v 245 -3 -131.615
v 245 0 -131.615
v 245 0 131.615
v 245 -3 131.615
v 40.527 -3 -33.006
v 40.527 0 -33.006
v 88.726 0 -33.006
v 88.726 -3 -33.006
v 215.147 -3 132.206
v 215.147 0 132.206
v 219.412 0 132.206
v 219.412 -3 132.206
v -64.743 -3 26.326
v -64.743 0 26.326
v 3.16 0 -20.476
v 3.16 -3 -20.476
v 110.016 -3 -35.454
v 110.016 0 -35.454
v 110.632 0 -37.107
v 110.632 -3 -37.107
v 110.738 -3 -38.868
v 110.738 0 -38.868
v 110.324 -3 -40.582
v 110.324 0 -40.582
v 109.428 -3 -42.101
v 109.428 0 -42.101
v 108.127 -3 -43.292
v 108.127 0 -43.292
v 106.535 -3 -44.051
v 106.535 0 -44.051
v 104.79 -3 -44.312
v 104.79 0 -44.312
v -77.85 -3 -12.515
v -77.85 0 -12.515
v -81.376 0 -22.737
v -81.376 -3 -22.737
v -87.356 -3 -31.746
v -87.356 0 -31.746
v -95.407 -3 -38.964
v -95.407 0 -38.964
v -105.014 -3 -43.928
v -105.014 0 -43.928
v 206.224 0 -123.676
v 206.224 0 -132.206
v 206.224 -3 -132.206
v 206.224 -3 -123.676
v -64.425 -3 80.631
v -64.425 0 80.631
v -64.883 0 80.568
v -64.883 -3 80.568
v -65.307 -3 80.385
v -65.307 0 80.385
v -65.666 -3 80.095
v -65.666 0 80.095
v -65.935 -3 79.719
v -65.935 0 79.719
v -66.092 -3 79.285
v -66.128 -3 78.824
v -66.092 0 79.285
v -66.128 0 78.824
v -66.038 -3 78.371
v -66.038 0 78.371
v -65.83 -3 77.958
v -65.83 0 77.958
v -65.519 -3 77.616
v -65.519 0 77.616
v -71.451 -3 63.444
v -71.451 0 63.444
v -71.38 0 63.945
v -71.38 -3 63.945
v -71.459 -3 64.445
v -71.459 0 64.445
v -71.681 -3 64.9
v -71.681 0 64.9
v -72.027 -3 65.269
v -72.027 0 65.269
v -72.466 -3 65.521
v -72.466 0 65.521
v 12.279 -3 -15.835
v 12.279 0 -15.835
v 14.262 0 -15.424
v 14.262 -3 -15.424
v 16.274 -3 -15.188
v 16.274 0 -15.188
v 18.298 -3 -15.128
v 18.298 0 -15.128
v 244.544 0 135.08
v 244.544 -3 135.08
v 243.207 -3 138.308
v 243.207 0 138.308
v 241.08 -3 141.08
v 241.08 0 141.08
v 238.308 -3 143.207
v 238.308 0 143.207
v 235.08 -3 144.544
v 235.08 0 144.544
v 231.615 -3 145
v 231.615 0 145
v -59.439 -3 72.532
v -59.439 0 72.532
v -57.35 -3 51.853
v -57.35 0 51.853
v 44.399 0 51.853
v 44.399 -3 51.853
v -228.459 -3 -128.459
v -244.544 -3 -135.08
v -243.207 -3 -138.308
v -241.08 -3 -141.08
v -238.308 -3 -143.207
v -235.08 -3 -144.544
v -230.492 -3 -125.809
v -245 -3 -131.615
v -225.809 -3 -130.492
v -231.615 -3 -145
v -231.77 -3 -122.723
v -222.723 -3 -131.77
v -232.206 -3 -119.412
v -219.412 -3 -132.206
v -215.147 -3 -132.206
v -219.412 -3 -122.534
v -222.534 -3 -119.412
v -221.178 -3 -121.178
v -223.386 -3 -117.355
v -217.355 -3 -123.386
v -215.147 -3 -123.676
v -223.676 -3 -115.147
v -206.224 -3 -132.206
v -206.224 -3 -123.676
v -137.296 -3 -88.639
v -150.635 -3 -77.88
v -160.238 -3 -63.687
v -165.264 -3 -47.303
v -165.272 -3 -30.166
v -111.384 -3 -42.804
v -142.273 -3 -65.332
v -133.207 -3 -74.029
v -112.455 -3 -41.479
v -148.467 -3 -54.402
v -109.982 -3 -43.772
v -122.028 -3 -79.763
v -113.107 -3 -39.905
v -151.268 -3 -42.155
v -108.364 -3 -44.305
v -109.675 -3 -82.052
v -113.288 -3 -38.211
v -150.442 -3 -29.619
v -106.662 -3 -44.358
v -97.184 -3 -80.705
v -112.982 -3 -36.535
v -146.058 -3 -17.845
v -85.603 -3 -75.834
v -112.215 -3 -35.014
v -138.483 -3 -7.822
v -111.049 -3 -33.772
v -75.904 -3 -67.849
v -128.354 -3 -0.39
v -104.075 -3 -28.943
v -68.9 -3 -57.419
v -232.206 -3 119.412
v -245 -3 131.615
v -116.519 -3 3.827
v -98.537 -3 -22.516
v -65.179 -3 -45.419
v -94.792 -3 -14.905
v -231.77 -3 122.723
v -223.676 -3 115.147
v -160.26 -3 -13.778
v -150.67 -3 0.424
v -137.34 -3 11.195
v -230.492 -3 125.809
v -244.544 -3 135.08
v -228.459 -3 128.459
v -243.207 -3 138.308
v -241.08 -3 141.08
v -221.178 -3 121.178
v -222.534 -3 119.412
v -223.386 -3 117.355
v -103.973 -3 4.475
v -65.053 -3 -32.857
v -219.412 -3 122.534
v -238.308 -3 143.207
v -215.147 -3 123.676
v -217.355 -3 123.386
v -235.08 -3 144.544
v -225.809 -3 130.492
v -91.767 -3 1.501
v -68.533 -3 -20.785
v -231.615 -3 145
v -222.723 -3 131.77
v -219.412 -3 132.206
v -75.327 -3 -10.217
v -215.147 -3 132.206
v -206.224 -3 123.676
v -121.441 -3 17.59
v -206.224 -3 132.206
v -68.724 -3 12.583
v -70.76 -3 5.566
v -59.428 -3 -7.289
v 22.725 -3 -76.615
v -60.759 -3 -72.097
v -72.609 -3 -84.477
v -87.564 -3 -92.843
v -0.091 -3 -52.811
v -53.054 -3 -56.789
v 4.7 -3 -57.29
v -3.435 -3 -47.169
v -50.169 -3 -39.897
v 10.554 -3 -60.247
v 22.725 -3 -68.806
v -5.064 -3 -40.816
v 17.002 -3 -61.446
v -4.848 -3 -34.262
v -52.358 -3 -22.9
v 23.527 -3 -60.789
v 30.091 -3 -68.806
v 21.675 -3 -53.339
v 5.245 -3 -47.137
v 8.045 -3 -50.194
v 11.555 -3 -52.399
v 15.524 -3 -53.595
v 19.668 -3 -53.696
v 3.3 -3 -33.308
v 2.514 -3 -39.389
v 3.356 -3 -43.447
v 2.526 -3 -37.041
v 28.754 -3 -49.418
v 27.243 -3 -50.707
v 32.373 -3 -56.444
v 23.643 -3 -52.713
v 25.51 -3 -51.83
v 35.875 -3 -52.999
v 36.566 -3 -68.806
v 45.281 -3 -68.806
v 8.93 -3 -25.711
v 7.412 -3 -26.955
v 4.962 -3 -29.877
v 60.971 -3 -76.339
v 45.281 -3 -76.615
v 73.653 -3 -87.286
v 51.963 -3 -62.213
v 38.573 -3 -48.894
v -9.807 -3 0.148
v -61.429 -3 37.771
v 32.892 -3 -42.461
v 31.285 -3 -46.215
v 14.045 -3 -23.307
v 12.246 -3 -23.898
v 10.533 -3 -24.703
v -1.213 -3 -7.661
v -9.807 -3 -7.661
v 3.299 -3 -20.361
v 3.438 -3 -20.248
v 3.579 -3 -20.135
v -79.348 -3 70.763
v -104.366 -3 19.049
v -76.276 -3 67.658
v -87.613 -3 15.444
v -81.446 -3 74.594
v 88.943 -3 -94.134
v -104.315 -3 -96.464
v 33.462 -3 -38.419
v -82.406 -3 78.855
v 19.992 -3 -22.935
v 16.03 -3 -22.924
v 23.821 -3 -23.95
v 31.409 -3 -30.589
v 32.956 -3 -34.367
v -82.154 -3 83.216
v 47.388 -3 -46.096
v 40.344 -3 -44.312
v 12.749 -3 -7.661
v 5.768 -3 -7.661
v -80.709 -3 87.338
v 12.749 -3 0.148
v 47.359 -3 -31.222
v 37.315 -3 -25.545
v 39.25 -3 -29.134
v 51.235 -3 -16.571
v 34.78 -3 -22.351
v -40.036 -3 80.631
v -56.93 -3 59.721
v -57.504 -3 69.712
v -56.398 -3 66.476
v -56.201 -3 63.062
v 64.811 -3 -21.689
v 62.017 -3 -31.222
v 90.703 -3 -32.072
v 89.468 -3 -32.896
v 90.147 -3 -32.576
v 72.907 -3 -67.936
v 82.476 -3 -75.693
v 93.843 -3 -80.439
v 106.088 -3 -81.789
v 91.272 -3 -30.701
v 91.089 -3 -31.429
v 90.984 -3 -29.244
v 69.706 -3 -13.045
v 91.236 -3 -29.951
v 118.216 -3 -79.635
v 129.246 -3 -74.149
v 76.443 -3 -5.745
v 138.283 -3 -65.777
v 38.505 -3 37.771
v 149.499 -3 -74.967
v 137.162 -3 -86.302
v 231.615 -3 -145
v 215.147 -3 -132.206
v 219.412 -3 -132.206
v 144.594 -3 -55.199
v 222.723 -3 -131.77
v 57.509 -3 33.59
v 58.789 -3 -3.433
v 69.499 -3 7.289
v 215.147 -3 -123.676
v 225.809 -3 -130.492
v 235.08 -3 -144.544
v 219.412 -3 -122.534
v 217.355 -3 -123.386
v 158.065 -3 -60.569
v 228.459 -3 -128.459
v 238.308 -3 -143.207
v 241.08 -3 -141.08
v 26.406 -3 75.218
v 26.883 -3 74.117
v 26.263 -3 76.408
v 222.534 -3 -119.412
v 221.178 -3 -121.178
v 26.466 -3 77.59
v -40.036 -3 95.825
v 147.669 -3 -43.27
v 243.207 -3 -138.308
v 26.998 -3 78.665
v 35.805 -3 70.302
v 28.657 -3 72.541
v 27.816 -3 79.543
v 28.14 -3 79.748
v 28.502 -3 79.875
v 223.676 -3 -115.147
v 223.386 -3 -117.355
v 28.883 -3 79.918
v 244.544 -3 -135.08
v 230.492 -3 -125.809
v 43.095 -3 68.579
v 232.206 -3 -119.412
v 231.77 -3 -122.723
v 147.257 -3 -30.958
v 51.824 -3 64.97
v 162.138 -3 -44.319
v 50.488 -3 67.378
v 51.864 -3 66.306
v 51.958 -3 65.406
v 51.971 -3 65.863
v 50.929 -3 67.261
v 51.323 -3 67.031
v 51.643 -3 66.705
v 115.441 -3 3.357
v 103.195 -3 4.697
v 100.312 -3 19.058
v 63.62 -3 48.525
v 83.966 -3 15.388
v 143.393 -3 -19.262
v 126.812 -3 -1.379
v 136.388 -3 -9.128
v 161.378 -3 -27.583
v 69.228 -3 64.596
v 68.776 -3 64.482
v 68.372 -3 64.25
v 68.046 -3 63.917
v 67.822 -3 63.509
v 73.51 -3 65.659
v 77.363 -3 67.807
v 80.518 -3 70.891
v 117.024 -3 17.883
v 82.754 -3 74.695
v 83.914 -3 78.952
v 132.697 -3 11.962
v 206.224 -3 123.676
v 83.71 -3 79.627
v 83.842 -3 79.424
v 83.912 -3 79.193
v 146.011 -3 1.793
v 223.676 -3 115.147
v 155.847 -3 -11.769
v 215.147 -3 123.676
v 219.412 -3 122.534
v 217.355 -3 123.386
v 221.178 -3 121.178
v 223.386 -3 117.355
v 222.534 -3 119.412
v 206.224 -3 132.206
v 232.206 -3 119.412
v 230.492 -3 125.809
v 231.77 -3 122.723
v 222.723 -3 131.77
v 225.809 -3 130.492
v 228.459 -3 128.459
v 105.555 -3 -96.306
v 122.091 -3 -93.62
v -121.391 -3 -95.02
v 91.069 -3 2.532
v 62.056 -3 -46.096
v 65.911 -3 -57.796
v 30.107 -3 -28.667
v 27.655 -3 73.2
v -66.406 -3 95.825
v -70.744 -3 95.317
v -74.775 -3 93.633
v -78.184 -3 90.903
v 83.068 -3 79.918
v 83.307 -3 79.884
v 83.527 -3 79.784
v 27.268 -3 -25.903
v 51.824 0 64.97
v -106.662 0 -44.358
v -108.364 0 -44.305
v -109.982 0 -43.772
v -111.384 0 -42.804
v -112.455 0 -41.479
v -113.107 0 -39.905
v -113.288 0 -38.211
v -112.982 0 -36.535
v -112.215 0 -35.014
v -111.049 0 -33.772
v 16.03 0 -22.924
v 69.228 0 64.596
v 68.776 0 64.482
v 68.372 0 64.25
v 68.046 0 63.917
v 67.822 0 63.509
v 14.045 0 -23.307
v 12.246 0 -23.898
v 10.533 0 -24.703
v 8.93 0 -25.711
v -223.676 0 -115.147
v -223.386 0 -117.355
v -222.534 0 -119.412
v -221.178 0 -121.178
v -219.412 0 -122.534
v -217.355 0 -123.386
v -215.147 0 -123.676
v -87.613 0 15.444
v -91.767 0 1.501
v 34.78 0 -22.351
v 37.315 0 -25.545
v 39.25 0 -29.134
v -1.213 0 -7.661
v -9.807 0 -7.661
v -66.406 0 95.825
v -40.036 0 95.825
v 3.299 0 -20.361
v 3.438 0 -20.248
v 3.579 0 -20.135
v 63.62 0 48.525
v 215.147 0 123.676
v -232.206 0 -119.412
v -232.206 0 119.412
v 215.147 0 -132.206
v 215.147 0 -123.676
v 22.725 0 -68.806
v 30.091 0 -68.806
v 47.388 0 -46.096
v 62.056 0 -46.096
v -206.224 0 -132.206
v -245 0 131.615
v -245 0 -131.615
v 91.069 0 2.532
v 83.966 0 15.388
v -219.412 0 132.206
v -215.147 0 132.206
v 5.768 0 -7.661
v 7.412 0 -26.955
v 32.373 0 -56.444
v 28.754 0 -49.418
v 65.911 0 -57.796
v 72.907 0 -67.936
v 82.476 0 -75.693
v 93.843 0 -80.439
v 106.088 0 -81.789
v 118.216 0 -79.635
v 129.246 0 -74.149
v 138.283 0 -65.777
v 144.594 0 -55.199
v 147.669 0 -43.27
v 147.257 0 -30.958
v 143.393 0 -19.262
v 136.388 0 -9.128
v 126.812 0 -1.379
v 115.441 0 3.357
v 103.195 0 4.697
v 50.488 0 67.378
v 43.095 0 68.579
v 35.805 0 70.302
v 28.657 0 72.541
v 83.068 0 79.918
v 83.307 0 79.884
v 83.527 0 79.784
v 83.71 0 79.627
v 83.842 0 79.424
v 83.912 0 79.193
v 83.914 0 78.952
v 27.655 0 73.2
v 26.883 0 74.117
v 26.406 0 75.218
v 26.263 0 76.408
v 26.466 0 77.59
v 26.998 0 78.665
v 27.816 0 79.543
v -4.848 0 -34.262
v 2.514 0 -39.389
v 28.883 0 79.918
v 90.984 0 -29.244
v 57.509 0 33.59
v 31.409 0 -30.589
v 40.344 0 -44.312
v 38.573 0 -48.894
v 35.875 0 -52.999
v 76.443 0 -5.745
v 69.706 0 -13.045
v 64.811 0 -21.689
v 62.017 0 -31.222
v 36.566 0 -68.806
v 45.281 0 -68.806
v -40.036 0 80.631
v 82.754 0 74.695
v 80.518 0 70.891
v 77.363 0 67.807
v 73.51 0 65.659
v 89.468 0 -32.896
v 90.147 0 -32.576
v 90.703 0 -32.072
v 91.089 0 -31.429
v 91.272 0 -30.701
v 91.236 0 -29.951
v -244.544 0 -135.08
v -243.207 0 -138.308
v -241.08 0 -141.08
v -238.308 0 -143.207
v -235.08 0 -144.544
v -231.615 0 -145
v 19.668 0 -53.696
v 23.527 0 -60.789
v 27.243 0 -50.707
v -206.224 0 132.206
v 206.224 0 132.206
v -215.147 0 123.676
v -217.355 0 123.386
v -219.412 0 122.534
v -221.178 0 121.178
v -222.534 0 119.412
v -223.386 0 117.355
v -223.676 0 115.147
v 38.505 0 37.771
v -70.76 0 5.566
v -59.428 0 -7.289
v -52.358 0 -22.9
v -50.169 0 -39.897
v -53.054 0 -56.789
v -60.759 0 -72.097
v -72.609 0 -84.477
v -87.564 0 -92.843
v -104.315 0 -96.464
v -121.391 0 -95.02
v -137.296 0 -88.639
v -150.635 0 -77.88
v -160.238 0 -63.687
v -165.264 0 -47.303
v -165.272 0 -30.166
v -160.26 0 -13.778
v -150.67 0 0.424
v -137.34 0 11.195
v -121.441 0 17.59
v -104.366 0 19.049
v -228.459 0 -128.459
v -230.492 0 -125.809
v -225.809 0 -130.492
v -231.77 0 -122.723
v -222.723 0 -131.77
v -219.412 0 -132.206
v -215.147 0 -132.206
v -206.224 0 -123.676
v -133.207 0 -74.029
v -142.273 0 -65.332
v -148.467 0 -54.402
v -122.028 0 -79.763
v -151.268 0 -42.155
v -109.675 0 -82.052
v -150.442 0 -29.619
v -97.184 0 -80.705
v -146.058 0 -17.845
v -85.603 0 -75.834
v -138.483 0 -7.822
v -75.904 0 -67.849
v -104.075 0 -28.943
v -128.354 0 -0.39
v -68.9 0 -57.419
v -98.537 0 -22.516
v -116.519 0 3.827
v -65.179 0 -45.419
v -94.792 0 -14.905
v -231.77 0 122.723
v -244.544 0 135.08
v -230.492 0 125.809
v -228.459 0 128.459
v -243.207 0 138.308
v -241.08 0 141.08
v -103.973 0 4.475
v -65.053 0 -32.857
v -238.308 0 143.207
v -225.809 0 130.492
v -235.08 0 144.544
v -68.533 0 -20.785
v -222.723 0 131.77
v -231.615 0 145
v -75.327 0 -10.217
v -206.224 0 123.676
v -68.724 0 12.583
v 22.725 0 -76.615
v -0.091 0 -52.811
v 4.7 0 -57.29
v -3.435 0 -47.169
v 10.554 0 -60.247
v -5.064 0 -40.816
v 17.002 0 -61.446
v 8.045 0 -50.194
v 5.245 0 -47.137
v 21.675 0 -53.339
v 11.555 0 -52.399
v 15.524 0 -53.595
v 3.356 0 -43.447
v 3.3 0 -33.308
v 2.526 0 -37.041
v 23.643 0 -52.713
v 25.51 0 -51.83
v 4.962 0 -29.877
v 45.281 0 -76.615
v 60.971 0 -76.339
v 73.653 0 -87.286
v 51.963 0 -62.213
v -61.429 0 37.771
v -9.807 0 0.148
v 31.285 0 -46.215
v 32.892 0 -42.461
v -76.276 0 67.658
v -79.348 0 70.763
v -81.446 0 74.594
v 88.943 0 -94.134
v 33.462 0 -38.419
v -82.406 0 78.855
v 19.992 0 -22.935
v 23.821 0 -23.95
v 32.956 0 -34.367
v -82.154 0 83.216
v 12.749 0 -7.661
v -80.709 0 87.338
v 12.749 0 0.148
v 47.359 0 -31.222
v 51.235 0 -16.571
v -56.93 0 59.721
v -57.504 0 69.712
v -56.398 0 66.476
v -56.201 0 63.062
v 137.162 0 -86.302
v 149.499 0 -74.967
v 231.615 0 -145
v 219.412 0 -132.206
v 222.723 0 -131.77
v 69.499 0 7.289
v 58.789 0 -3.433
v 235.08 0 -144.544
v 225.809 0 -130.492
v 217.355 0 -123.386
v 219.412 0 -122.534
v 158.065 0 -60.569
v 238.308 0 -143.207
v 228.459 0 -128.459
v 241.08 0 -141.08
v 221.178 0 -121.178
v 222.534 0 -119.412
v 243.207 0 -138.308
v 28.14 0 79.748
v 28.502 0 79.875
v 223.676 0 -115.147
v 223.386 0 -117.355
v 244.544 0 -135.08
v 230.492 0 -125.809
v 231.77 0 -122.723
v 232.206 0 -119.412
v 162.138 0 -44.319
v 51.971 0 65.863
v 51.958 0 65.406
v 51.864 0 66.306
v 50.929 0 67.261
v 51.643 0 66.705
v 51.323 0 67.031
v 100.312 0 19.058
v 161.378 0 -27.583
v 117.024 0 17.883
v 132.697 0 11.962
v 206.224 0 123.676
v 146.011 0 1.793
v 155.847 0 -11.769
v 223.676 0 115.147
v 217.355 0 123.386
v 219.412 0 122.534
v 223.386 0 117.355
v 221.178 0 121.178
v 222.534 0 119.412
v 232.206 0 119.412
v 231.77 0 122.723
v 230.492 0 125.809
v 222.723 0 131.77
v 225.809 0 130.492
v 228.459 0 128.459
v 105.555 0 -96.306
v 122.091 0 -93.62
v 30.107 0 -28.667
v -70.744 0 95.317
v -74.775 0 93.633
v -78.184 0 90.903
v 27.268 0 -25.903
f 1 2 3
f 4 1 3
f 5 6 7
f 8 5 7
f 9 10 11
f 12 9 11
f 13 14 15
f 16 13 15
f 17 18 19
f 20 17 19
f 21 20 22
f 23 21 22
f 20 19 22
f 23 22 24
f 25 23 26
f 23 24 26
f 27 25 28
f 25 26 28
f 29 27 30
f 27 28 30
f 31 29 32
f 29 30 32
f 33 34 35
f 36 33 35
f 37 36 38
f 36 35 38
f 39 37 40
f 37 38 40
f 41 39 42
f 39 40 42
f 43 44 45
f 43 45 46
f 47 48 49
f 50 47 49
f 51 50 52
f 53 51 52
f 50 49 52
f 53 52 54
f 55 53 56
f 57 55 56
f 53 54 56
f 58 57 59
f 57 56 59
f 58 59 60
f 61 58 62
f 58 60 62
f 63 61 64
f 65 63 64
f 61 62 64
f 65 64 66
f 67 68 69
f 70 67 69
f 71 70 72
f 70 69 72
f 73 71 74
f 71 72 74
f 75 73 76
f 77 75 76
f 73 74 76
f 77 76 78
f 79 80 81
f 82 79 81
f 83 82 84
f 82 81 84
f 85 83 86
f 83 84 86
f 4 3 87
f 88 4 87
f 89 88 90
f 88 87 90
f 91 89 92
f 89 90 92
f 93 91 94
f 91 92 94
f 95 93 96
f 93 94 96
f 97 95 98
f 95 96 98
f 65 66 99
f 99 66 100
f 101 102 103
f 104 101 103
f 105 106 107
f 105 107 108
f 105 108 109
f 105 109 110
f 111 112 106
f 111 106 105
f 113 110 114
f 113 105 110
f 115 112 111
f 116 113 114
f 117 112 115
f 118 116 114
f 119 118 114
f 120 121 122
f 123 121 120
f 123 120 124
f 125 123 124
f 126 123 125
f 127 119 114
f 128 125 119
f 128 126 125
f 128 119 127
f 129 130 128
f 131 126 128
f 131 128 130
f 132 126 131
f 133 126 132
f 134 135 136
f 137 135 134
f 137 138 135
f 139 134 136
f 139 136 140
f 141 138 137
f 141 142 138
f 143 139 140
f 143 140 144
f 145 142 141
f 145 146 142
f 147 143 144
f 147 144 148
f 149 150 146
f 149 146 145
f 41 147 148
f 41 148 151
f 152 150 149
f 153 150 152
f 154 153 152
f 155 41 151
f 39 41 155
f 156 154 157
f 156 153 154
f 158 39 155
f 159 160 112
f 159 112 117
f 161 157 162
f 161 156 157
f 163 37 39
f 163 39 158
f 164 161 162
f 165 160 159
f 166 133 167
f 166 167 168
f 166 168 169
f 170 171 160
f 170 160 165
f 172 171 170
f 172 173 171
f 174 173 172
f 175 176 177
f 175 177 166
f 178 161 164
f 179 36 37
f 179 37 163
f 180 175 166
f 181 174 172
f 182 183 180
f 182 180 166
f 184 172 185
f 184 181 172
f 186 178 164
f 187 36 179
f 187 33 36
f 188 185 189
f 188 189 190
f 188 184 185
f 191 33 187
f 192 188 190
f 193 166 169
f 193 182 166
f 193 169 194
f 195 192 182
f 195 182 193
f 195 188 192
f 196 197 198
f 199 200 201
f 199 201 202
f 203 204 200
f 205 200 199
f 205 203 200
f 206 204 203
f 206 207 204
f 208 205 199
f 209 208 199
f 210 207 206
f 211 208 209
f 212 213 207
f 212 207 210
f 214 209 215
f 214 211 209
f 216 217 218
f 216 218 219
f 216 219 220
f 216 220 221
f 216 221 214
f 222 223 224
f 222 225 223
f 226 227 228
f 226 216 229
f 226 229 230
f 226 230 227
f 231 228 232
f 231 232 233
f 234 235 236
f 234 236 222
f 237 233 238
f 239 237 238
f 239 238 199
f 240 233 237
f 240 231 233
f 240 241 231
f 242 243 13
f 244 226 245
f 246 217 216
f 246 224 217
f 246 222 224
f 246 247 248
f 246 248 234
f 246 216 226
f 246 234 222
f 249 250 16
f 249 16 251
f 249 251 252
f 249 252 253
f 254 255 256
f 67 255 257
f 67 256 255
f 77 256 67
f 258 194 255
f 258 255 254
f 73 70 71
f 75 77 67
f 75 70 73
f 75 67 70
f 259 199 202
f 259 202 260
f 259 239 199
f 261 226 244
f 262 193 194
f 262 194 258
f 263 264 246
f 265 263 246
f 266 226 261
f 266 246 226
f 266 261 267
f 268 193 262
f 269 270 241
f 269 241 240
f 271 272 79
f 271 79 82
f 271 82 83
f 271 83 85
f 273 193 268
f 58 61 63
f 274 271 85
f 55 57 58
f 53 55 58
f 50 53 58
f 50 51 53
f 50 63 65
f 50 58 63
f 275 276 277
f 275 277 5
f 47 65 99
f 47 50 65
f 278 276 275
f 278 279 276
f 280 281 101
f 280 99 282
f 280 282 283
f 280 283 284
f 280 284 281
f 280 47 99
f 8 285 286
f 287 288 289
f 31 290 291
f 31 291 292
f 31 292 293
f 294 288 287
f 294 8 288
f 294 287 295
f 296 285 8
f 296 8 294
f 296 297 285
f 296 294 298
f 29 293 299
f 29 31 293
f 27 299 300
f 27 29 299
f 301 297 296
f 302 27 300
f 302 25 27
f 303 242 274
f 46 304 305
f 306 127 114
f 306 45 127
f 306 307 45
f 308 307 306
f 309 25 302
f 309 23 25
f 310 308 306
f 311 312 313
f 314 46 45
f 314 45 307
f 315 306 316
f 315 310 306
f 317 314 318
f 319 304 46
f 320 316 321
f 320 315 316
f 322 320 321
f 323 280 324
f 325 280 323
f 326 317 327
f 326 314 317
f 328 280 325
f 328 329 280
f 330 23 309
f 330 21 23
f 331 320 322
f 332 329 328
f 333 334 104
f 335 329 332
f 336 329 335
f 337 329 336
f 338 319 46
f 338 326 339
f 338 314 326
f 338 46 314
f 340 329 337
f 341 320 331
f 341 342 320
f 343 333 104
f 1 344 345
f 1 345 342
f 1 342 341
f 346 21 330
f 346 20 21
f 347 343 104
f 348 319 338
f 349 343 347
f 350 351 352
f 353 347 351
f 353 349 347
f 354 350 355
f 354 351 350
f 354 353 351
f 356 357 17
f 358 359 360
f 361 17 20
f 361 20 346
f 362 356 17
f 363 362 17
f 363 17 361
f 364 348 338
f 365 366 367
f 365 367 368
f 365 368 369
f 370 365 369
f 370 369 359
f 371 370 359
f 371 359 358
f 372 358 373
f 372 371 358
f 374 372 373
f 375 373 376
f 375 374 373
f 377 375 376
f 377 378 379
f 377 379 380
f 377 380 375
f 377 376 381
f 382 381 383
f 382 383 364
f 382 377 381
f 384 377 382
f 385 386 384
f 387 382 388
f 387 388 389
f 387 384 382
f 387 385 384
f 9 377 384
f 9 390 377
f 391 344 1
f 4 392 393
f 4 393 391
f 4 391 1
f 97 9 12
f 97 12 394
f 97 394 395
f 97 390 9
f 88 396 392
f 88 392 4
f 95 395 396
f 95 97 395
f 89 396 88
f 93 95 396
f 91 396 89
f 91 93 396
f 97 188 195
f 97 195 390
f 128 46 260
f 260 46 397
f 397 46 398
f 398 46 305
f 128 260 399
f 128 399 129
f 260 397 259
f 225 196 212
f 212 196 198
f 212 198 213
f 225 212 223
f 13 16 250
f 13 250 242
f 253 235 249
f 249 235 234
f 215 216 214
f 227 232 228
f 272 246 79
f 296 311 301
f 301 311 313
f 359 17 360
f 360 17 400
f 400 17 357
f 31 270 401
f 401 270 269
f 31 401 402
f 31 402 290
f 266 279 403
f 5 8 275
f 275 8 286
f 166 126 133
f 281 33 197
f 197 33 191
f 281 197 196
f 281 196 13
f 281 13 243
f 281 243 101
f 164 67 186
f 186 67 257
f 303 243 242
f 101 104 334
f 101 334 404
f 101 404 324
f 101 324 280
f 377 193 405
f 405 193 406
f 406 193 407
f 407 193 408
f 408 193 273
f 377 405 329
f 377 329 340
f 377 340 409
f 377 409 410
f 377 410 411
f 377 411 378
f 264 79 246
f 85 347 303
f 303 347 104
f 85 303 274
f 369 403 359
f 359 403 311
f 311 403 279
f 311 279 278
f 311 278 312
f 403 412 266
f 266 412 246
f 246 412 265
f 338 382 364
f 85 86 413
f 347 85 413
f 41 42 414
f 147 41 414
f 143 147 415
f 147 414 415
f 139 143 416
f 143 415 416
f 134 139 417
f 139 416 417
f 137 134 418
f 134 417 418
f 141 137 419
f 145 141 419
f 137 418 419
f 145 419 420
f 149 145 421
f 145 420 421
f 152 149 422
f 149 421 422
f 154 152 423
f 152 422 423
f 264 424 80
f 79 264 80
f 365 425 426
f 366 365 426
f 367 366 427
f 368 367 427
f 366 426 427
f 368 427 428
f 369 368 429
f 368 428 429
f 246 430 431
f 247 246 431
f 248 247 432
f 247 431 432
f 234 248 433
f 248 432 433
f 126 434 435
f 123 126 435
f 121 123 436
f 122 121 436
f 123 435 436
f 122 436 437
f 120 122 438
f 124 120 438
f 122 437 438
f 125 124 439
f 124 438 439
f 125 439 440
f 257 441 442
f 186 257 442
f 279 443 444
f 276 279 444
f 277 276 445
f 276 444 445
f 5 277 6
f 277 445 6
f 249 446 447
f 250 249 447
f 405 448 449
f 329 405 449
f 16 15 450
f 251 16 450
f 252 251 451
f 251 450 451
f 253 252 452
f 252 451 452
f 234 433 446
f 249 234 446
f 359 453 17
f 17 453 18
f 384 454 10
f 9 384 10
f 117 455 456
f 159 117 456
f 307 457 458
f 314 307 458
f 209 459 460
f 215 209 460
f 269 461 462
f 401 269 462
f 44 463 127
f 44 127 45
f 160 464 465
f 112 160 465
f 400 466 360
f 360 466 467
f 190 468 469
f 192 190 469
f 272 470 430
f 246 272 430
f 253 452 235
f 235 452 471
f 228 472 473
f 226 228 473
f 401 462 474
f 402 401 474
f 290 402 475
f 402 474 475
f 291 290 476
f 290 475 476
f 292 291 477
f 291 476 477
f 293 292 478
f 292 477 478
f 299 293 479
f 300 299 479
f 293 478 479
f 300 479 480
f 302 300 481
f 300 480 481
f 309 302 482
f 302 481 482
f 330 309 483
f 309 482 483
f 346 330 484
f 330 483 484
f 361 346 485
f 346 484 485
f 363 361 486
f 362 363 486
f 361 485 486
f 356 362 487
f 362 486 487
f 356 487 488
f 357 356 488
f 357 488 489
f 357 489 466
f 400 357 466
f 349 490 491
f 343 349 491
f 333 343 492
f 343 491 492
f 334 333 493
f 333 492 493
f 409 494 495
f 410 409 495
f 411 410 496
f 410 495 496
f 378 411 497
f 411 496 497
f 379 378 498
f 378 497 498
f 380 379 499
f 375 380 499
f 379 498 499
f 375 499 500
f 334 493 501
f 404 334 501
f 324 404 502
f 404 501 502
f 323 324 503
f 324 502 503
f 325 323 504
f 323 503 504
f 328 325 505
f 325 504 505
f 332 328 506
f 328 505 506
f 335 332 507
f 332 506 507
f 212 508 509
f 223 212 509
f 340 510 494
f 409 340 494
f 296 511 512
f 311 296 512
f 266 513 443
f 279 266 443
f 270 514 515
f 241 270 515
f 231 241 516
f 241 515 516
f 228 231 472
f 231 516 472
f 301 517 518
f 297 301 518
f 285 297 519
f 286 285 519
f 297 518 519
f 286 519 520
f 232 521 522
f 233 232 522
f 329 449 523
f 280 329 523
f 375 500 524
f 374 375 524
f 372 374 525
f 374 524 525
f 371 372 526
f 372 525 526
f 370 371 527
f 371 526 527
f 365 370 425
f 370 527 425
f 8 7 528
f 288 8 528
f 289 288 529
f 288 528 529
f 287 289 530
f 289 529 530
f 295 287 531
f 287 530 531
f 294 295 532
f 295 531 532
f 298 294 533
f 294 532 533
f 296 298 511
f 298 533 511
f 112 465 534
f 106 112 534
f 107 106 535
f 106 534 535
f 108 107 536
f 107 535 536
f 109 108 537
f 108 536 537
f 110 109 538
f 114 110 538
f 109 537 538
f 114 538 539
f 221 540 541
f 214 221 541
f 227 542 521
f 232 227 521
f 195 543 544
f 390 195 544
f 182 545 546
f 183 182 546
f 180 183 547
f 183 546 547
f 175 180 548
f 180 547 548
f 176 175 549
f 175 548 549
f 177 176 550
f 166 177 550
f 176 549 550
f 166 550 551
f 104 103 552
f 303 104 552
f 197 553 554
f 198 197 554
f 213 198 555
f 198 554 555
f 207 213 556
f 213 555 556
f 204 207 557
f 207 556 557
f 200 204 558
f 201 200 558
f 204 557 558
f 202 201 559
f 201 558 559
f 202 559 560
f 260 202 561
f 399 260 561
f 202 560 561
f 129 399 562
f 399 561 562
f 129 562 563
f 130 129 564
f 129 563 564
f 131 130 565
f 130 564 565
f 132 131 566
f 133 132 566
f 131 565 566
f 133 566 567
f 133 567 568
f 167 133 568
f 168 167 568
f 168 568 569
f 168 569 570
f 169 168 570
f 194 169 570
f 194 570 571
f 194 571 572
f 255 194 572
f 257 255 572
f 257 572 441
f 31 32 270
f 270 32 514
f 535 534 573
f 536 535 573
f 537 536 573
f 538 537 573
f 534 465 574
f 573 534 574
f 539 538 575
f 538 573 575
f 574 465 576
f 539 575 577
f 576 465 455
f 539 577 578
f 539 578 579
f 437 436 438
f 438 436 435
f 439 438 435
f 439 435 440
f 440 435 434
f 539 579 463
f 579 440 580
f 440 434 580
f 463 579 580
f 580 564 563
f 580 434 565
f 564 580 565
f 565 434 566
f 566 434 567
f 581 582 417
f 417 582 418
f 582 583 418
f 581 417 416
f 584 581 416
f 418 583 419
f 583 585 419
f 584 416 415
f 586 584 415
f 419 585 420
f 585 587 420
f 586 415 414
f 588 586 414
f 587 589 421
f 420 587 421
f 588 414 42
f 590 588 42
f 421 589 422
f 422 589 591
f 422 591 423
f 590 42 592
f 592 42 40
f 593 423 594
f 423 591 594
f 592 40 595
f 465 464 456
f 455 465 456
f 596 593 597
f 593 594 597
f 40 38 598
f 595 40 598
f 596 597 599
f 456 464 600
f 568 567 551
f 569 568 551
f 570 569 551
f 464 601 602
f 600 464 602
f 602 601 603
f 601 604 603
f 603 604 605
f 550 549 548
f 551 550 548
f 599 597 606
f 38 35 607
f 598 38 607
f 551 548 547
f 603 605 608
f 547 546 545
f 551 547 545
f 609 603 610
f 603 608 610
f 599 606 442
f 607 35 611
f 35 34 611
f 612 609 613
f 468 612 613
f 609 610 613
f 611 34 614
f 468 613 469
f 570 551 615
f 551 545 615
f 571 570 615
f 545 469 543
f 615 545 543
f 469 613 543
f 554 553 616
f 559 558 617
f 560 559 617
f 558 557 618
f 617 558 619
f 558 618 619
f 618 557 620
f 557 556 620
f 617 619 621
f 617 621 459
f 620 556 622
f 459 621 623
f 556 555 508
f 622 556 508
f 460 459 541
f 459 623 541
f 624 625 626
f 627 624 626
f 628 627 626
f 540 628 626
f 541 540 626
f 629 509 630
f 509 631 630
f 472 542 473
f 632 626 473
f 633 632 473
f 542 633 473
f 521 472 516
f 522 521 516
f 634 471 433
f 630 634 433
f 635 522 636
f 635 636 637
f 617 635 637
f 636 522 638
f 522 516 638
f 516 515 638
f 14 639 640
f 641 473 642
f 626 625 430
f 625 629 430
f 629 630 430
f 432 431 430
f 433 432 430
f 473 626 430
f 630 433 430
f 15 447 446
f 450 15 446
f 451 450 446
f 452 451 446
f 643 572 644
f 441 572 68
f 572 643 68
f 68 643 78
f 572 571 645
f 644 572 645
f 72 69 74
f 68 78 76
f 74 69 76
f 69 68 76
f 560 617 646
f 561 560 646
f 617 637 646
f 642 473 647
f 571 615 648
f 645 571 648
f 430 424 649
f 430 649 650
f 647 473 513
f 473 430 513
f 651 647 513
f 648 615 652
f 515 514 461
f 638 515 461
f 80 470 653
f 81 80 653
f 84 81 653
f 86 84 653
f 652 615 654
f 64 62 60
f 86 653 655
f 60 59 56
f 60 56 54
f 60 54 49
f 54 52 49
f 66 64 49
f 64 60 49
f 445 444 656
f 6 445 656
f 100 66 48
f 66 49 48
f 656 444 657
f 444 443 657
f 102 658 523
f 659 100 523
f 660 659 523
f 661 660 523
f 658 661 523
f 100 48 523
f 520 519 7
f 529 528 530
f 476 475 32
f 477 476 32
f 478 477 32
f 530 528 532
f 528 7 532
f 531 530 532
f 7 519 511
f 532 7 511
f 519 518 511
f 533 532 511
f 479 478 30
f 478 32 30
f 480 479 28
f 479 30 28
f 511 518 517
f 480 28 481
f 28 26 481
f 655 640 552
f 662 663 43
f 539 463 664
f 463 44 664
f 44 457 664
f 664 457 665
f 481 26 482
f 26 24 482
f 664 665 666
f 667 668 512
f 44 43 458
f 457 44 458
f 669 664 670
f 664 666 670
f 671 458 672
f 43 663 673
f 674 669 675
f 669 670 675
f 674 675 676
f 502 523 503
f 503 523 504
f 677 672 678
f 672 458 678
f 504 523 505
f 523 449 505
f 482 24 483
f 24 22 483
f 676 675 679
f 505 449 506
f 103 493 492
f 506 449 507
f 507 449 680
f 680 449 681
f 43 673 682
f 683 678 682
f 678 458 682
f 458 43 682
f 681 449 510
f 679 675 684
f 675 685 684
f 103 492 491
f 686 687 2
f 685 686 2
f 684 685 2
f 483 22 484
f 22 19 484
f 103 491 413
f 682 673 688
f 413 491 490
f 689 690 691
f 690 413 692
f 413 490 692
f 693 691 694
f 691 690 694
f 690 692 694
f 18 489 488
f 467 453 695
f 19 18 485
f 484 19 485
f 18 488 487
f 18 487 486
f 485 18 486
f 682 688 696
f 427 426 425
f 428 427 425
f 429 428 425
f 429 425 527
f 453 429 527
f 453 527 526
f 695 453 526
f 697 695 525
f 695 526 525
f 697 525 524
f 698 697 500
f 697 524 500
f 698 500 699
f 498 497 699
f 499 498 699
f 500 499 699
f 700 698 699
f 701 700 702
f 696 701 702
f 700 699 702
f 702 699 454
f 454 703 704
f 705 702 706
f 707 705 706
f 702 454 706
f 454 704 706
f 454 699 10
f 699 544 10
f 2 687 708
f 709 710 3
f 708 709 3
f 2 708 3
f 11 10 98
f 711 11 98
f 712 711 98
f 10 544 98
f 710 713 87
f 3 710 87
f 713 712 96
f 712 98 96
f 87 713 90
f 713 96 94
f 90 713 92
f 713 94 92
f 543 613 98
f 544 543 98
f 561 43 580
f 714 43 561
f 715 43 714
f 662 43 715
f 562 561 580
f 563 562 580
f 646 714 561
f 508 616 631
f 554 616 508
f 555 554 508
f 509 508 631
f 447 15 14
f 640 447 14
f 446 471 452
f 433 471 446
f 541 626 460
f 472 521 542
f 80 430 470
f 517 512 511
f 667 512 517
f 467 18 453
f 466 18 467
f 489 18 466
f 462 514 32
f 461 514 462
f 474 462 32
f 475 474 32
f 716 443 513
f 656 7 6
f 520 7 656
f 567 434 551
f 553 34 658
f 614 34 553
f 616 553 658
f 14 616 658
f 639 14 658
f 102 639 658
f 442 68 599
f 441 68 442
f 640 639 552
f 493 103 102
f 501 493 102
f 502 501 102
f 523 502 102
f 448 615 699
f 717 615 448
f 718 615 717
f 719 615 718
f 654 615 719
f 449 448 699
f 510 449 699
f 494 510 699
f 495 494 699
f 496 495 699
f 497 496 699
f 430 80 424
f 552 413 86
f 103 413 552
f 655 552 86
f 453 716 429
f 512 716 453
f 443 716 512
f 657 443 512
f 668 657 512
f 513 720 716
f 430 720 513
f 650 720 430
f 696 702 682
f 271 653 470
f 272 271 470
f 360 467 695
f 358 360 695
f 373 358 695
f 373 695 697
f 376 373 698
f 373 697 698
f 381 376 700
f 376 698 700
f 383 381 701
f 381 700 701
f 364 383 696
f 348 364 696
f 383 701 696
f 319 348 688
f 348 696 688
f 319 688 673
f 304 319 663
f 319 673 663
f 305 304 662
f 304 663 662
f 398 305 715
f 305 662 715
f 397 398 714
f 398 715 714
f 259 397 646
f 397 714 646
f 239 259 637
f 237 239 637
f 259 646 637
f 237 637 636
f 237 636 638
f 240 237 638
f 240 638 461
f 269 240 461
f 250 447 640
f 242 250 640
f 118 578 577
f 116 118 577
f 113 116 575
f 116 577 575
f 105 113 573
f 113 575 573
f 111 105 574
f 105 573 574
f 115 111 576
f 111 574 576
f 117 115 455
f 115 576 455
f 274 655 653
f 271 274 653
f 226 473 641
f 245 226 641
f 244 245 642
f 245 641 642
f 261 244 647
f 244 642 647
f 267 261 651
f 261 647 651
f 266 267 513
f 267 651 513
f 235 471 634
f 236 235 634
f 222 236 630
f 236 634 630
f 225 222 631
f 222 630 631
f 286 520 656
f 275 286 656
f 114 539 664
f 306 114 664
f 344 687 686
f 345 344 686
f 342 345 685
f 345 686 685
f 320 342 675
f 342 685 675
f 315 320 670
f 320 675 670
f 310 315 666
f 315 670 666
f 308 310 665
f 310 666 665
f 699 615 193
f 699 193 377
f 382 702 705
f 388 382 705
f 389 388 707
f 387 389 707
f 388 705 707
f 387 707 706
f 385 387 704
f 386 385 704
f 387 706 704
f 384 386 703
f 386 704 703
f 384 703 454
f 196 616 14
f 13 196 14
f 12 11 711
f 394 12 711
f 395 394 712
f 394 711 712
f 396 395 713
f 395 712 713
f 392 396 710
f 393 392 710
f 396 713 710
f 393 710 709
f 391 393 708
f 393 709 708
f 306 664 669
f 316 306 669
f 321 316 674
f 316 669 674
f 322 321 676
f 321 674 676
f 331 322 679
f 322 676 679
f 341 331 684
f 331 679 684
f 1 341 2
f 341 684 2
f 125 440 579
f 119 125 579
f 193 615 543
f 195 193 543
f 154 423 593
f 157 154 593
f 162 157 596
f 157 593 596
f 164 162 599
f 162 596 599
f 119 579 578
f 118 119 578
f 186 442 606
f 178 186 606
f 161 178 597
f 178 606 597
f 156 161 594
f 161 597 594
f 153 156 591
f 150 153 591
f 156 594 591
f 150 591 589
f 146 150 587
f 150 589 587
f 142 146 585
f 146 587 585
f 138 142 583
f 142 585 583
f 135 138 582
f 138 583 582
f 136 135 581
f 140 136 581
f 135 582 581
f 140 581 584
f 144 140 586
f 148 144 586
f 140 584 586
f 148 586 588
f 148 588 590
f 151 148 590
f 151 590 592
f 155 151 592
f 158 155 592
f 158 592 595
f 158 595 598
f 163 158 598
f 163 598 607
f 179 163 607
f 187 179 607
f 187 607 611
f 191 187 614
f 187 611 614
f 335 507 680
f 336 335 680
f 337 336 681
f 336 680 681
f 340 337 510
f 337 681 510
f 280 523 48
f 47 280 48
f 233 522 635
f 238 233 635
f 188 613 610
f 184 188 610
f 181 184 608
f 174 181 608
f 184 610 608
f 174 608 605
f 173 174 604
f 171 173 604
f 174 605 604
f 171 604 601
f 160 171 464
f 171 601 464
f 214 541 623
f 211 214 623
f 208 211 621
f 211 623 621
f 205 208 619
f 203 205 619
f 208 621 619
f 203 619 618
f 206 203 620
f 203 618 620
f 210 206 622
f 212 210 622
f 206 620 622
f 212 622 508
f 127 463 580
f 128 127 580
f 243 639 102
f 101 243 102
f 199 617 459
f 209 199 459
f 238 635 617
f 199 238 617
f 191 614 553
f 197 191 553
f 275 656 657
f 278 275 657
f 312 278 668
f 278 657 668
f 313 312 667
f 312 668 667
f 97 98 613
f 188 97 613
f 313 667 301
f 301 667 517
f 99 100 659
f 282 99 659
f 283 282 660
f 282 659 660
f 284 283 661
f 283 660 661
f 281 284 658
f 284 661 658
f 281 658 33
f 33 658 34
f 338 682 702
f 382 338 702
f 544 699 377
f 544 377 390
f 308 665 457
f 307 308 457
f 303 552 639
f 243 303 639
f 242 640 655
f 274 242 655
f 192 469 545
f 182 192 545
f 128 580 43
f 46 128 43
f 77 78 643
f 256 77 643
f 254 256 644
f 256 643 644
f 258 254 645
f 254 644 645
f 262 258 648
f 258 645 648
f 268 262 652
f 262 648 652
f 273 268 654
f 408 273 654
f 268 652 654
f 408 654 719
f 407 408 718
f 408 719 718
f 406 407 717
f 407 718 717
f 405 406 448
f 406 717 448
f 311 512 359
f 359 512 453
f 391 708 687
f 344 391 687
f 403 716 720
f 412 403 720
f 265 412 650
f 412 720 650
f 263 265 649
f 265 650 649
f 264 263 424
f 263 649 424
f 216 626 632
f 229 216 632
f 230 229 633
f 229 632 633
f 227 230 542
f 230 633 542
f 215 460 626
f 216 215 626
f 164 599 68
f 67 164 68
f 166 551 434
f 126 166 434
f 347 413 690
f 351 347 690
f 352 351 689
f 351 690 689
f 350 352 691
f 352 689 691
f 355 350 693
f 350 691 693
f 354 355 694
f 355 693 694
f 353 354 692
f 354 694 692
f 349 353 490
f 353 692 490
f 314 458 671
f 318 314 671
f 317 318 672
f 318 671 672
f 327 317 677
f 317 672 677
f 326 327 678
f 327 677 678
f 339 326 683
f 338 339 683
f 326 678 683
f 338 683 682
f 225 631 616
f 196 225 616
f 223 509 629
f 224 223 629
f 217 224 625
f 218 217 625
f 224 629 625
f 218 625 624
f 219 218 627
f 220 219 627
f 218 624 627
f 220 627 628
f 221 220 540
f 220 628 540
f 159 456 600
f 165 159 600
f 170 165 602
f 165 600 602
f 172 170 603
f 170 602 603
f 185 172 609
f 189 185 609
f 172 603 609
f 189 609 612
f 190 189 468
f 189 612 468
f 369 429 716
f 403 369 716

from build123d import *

# Parameters (mm, degrees)
F0_W     = 412.447963
F0_H     = 8.529411
F0_H_2   = 8.529412
F1_DEPTH = 3


# Not quite as in the source:
# - ends of sketch curves that miss each other by under 0.0002 mm in the source are joined


with BuildPart() as f1:
    # F0 (on Front) → F1 (new body)
    with BuildSketch(Plane.XZ):
        with BuildLine():
            Line((-245, 131.615385), (-245, -131.615384))
            ThreePointArc((-245, -131.615384), (-241.0797377372, -141.0797367372), (-231.615385, -145))
            Line((-231.615385, -145), (231.615384, -145))
            ThreePointArc((231.615384, -145), (241.0797367372, -141.0797367372), (245, -131.615384))
            Line((245, -131.615384), (245, 131.615385))
            ThreePointArc((245, 131.615385), (241.0797367372, 141.0797377372), (231.615384, 145.000001))
            Line((231.615384, 145.000001), (-231.615385, 145))
            ThreePointArc((-231.615385, 145), (-241.0797377372, 141.0797377372), (-245, 131.615385))
        make_face()
        with BuildLine():
            ThreePointArc((-223.67647, -115.147058), (-221.1782633576, -121.1782623576), (-215.147059, -123.676469))
            Line((-215.147059, -123.676469), (-215.147059, -132.205882))
            Line((-215.147059, -132.205882), (-219.411765, -132.205882))
            ThreePointArc((-219.411765, -132.205882), (-228.4585725971, -128.4585725971), (-232.205883, -119.411765))
            Line((-232.205883, -119.411765), (-232.205883, 119.411764))
            ThreePointArc((-232.205883, 119.411764), (-228.4585725971, 128.4585715971), (-219.411765, 132.205882))
            Line((-219.411765, 132.205882), (-215.147059, 132.205883))
            Line((-215.147059, 132.205883), (-215.147059, 123.676471))
            ThreePointArc((-215.147059, 123.676471), (-221.1782633576, 121.1782633576), (-223.67647, 115.147059))
            Line((-223.67647, 115.147059), (-223.67647, -115.147058))
        make_face(mode=Mode.SUBTRACT)
        with BuildLine():
            ThreePointArc((-70.7599172527, 5.5663826998), (-137.2958198093, -88.6390266704), (-87.6127799718, 15.4440220749))
            Line((-87.6127799718, 15.4440220749), (-91.766694, 1.50065))
            ThreePointArc((-91.766694, 1.50065), (-133.2066284732, -74.0292729296), (-75.3272882753, -10.2168972398))
            Line((-75.3272882753, -10.2168972398), (-70.7599172527, 5.5663826998))
        make_face(mode=Mode.SUBTRACT)
        with BuildLine():
            Line((-68.723593, 12.582627), (-64.743288, 26.326147))
            Line((-64.743288, 26.326147), (3.159571, -20.475886))
            ThreePointArc((3.159571, -20.475886), (3.3683994767, -20.3043898267), (3.5792137936, -20.1353407395))
            Line((3.5792137936, -20.1353407395), (7.411744, -26.95528))
            ThreePointArc((7.411744, -26.95528), (4.0249471652, -31.5409295129), (2.5258681402, -37.0410509302))
            Line((2.5258681402, -37.0410509302), (-68.723593, 12.582627))
        make_face(mode=Mode.SUBTRACT)
        with Locations((-5e-07, -127.9411765)):
            Rectangle(F0_W, F0_H, mode=Mode.SUBTRACT)
        with BuildLine():
            Line((22.72508, -68.805566), (30.090636, -68.805566))
            Line((30.090636, -68.805566), (21.674726, -53.339399))
            ThreePointArc((21.674726, -53.339399), (24.591046355, -52.3025256725), (27.243072314, -50.7066594202))
            Line((27.243072314, -50.7066594202), (36.565765, -68.805566))
            Line((36.565765, -68.805566), (45.281341, -68.805566))
            Line((45.281341, -68.805566), (45.281341, -76.614964))
            Line((45.281341, -76.614964), (22.72508, -76.614964))
            Line((22.72508, -76.614964), (22.72508, -68.805566))
        make_face(mode=Mode.SUBTRACT)
        with BuildLine():
            Line((-4.847605, -34.261624), (2.51358, -39.388528))
            ThreePointArc((2.51358, -39.388528), (8.0448119147, -50.1939653909), (19.6676101132, -53.6957600257))
            Line((19.6676101132, -53.6957600257), (23.527377, -60.788967))
            ThreePointArc((23.527377, -60.788967), (2.1451797481, -55.2211156409), (-4.847605, -34.261624))
        make_face(mode=Mode.SUBTRACT)
        with BuildLine():
            ThreePointArc((83.96580189, 15.3881272867), (154.3064474066, -68.0805916135), (47.3881182197, -46.096407971))
            Line((47.3881182197, -46.096407971), (62.056469, -46.096408))
            ThreePointArc((62.056469, -46.096408), (141.8170821306, -60.7137946065), (91.0686279767, 2.5318990705))
            Line((91.0686279767, 2.5318990705), (83.96580189, 15.3881272867))
        make_face(mode=Mode.SUBTRACT)
        with BuildLine():
            Line((8.930442, -25.711427), (-1.213114, -7.6611))
            Line((-1.213114, -7.6611), (-9.807377, -7.6611))
            Line((-9.807377, -7.6611), (-9.807377, 0.1483))
            Line((-9.807377, 0.1483), (12.748884, 0.1483))
            Line((12.748884, 0.1483), (12.748884, -7.6611))
            Line((12.748884, -7.6611), (5.767885, -7.6611))
            Line((5.767885, -7.6611), (14.045243, -23.30707))
            ThreePointArc((14.045243, -23.30707), (11.3772825006, -24.2740536292), (8.930442, -25.711427))
        make_face(mode=Mode.SUBTRACT)
        with BuildLine():
            ThreePointArc((47.3586275037, -31.2217609366), (54.5791913728, -9.7531888086), (69.4990666913, 7.2889194025))
            Line((69.4990666913, 7.2889194025), (76.442916, -5.74499))
            ThreePointArc((76.442916, -5.74499), (67.0095000702, -17.2261004781), (62.0168330844, -31.2217610145))
            Line((62.0168330844, -31.2217610145), (47.3586275037, -31.2217609366))
        make_face(mode=Mode.SUBTRACT)
        with BuildLine():
            Line((90.984376, -29.244421), (57.508949, 33.590423))
            Line((57.508949, 33.590423), (63.619612, 48.524677))
            Line((63.619612, 48.524677), (110.016211, -35.453915))
            ThreePointArc((110.016211, -35.453915), (109.9324845309, -41.3751059281), (104.790172, -44.311794))
            Line((104.790172, -44.311794), (40.343874, -44.311793))
            ThreePointArc((40.343874, -44.311793), (37.3331086152, -51.0181961304), (32.3730594707, -56.443918593))
            Line((32.3730594707, -56.443918593), (28.754286, -49.418498))
            ThreePointArc((28.754286, -49.418498), (33.3103193803, -40.4589080248), (31.409337593, -30.5888542334))
            Line((31.409337593, -30.5888542334), (34.77995, -22.351191))
            ThreePointArc((34.77995, -22.351191), (38.3615541693, -27.2968191094), (40.5267526716, -33.006376077))
            Line((40.5267526716, -33.006376077), (88.726046, -33.006377))
            ThreePointArc((88.726046, -33.006377), (90.9199219225, -31.7645528859), (90.984376, -29.244421))
        make_face(mode=Mode.SUBTRACT)
        with BuildLine():
            Line((219.411764, -132.205882), (215.147059, -132.205882))
            Line((215.147059, -132.205882), (215.147059, -123.676471))
            ThreePointArc((215.147059, -123.676471), (221.1782633576, -121.1782623576), (223.67647, -115.147058))
            Line((223.67647, -115.147058), (223.67647, 115.147059))
            ThreePointArc((223.67647, 115.147059), (221.1782633576, 121.1782633576), (215.147059, 123.67647))
            Line((215.147059, 123.67647), (215.147059, 132.205883))
            Line((215.147059, 132.205883), (219.411764, 132.205882))
            ThreePointArc((219.411764, 132.205882), (228.4585715971, 128.4585715971), (232.205882, 119.411764))
            Line((232.205882, 119.411764), (232.205881, -119.411765))
            ThreePointArc((232.205881, -119.411765), (228.4585715971, -128.4585725971), (219.411764, -132.205882))
        make_face(mode=Mode.SUBTRACT)
        with BuildLine():
            ThreePointArc((-72.4661841519, 65.5207366103), (-82.1538966479, 83.216021136), (-66.4060260229, 95.8247260113))
            Line((-66.4060260229, 95.8247260113), (-40.035993, 95.824726))
            Line((-40.035993, 95.824726), (-40.035993, 80.630917))
            Line((-40.035993, 80.630917), (-64.424786, 80.630917))
            ThreePointArc((-64.424786, 80.630917), (-66.0282591874, 79.5071913113), (-65.5192035969, 77.616491482))
            Line((-65.5192035969, 77.616491482), (-59.43939, 72.531557))
            ThreePointArc((-59.43939, 72.531557), (-56.3975970197, 66.4763179948), (-56.9296708586, 59.7209263141))
            Line((-56.9296708586, 59.7209263141), (-77.850161, -12.515038))
            ThreePointArc((-77.850161, -12.515038), (-87.3559409811, -31.7459411903), (-105.0135430166, -43.9277549547))
            ThreePointArc((-105.0135430166, -43.9277549547), (-112.4545221205, -41.478665578), (-111.0494858176, -33.7720412284))
            ThreePointArc((-111.0494858176, -33.7720412284), (-101.1018664771, -25.9057272999), (-94.7919815143, -14.9048461665))
            Line((-94.7919815143, -14.9048461665), (-71.450754, 63.444245))
            ThreePointArc((-71.450754, 63.444245), (-71.5531660844, 64.6806886283), (-72.4661841519, 65.5207366103))
        make_face(mode=Mode.SUBTRACT)
        Polygon((-61.428563, 37.771498), (-57.350449, 51.85274), (44.398561, 51.85274), (38.504827, 37.771498), align=None, mode=Mode.SUBTRACT)
        with BuildLine():
            ThreePointArc((12.2794031528, -15.8349486032), (15.2656197234, -15.2838363253), (18.2982629962, -15.1279872662))
            Line((18.2982629962, -15.1279872662), (51.823582, 64.970319))
            ThreePointArc((51.823582, 64.970319), (51.7665690353, 66.512857989), (50.4881340177, 67.3778901407))
            ThreePointArc((50.4881340177, 67.3778901407), (39.4345578147, 69.3755880777), (28.6570272111, 72.5405805985))
            ThreePointArc((28.6570272111, 72.5405805985), (26.2908771018, 75.8079169957), (27.8157723755, 79.5427327786))
            ThreePointArc((27.8157723755, 79.5427327786), (28.3174115009, 79.8213352122), (28.883051, 79.917843))
            Line((28.883051, 79.917843), (83.068308, 79.917844))
            ThreePointArc((83.068308, 79.917844), (83.7102572475, 79.6265153128), (83.9136824011, 78.9515420803))
            ThreePointArc((83.9136824011, 78.9515420803), (79.0432795601, 69.2443269594), (69.2278859862, 64.5957881246))
            ThreePointArc((69.2278859862, 64.5957881246), (68.3724892885, 64.249714451), (67.8224577861, 63.5088130817))
            Line((67.8224577861, 63.5088130817), (30.106815, -28.666942))
            ThreePointArc((30.106815, -28.666942), (23.8211455462, -23.950033286), (16.0297460076, -22.92389506))
            Line((16.0297460076, -22.92389506), (12.2794031528, -15.8349486032))
        make_face(mode=Mode.SUBTRACT)
        with Locations((-5e-07, 127.941177)):
            Rectangle(F0_W, F0_H_2, mode=Mode.SUBTRACT)
    extrude(amount=F1_DEPTH)


solid = f1.part
